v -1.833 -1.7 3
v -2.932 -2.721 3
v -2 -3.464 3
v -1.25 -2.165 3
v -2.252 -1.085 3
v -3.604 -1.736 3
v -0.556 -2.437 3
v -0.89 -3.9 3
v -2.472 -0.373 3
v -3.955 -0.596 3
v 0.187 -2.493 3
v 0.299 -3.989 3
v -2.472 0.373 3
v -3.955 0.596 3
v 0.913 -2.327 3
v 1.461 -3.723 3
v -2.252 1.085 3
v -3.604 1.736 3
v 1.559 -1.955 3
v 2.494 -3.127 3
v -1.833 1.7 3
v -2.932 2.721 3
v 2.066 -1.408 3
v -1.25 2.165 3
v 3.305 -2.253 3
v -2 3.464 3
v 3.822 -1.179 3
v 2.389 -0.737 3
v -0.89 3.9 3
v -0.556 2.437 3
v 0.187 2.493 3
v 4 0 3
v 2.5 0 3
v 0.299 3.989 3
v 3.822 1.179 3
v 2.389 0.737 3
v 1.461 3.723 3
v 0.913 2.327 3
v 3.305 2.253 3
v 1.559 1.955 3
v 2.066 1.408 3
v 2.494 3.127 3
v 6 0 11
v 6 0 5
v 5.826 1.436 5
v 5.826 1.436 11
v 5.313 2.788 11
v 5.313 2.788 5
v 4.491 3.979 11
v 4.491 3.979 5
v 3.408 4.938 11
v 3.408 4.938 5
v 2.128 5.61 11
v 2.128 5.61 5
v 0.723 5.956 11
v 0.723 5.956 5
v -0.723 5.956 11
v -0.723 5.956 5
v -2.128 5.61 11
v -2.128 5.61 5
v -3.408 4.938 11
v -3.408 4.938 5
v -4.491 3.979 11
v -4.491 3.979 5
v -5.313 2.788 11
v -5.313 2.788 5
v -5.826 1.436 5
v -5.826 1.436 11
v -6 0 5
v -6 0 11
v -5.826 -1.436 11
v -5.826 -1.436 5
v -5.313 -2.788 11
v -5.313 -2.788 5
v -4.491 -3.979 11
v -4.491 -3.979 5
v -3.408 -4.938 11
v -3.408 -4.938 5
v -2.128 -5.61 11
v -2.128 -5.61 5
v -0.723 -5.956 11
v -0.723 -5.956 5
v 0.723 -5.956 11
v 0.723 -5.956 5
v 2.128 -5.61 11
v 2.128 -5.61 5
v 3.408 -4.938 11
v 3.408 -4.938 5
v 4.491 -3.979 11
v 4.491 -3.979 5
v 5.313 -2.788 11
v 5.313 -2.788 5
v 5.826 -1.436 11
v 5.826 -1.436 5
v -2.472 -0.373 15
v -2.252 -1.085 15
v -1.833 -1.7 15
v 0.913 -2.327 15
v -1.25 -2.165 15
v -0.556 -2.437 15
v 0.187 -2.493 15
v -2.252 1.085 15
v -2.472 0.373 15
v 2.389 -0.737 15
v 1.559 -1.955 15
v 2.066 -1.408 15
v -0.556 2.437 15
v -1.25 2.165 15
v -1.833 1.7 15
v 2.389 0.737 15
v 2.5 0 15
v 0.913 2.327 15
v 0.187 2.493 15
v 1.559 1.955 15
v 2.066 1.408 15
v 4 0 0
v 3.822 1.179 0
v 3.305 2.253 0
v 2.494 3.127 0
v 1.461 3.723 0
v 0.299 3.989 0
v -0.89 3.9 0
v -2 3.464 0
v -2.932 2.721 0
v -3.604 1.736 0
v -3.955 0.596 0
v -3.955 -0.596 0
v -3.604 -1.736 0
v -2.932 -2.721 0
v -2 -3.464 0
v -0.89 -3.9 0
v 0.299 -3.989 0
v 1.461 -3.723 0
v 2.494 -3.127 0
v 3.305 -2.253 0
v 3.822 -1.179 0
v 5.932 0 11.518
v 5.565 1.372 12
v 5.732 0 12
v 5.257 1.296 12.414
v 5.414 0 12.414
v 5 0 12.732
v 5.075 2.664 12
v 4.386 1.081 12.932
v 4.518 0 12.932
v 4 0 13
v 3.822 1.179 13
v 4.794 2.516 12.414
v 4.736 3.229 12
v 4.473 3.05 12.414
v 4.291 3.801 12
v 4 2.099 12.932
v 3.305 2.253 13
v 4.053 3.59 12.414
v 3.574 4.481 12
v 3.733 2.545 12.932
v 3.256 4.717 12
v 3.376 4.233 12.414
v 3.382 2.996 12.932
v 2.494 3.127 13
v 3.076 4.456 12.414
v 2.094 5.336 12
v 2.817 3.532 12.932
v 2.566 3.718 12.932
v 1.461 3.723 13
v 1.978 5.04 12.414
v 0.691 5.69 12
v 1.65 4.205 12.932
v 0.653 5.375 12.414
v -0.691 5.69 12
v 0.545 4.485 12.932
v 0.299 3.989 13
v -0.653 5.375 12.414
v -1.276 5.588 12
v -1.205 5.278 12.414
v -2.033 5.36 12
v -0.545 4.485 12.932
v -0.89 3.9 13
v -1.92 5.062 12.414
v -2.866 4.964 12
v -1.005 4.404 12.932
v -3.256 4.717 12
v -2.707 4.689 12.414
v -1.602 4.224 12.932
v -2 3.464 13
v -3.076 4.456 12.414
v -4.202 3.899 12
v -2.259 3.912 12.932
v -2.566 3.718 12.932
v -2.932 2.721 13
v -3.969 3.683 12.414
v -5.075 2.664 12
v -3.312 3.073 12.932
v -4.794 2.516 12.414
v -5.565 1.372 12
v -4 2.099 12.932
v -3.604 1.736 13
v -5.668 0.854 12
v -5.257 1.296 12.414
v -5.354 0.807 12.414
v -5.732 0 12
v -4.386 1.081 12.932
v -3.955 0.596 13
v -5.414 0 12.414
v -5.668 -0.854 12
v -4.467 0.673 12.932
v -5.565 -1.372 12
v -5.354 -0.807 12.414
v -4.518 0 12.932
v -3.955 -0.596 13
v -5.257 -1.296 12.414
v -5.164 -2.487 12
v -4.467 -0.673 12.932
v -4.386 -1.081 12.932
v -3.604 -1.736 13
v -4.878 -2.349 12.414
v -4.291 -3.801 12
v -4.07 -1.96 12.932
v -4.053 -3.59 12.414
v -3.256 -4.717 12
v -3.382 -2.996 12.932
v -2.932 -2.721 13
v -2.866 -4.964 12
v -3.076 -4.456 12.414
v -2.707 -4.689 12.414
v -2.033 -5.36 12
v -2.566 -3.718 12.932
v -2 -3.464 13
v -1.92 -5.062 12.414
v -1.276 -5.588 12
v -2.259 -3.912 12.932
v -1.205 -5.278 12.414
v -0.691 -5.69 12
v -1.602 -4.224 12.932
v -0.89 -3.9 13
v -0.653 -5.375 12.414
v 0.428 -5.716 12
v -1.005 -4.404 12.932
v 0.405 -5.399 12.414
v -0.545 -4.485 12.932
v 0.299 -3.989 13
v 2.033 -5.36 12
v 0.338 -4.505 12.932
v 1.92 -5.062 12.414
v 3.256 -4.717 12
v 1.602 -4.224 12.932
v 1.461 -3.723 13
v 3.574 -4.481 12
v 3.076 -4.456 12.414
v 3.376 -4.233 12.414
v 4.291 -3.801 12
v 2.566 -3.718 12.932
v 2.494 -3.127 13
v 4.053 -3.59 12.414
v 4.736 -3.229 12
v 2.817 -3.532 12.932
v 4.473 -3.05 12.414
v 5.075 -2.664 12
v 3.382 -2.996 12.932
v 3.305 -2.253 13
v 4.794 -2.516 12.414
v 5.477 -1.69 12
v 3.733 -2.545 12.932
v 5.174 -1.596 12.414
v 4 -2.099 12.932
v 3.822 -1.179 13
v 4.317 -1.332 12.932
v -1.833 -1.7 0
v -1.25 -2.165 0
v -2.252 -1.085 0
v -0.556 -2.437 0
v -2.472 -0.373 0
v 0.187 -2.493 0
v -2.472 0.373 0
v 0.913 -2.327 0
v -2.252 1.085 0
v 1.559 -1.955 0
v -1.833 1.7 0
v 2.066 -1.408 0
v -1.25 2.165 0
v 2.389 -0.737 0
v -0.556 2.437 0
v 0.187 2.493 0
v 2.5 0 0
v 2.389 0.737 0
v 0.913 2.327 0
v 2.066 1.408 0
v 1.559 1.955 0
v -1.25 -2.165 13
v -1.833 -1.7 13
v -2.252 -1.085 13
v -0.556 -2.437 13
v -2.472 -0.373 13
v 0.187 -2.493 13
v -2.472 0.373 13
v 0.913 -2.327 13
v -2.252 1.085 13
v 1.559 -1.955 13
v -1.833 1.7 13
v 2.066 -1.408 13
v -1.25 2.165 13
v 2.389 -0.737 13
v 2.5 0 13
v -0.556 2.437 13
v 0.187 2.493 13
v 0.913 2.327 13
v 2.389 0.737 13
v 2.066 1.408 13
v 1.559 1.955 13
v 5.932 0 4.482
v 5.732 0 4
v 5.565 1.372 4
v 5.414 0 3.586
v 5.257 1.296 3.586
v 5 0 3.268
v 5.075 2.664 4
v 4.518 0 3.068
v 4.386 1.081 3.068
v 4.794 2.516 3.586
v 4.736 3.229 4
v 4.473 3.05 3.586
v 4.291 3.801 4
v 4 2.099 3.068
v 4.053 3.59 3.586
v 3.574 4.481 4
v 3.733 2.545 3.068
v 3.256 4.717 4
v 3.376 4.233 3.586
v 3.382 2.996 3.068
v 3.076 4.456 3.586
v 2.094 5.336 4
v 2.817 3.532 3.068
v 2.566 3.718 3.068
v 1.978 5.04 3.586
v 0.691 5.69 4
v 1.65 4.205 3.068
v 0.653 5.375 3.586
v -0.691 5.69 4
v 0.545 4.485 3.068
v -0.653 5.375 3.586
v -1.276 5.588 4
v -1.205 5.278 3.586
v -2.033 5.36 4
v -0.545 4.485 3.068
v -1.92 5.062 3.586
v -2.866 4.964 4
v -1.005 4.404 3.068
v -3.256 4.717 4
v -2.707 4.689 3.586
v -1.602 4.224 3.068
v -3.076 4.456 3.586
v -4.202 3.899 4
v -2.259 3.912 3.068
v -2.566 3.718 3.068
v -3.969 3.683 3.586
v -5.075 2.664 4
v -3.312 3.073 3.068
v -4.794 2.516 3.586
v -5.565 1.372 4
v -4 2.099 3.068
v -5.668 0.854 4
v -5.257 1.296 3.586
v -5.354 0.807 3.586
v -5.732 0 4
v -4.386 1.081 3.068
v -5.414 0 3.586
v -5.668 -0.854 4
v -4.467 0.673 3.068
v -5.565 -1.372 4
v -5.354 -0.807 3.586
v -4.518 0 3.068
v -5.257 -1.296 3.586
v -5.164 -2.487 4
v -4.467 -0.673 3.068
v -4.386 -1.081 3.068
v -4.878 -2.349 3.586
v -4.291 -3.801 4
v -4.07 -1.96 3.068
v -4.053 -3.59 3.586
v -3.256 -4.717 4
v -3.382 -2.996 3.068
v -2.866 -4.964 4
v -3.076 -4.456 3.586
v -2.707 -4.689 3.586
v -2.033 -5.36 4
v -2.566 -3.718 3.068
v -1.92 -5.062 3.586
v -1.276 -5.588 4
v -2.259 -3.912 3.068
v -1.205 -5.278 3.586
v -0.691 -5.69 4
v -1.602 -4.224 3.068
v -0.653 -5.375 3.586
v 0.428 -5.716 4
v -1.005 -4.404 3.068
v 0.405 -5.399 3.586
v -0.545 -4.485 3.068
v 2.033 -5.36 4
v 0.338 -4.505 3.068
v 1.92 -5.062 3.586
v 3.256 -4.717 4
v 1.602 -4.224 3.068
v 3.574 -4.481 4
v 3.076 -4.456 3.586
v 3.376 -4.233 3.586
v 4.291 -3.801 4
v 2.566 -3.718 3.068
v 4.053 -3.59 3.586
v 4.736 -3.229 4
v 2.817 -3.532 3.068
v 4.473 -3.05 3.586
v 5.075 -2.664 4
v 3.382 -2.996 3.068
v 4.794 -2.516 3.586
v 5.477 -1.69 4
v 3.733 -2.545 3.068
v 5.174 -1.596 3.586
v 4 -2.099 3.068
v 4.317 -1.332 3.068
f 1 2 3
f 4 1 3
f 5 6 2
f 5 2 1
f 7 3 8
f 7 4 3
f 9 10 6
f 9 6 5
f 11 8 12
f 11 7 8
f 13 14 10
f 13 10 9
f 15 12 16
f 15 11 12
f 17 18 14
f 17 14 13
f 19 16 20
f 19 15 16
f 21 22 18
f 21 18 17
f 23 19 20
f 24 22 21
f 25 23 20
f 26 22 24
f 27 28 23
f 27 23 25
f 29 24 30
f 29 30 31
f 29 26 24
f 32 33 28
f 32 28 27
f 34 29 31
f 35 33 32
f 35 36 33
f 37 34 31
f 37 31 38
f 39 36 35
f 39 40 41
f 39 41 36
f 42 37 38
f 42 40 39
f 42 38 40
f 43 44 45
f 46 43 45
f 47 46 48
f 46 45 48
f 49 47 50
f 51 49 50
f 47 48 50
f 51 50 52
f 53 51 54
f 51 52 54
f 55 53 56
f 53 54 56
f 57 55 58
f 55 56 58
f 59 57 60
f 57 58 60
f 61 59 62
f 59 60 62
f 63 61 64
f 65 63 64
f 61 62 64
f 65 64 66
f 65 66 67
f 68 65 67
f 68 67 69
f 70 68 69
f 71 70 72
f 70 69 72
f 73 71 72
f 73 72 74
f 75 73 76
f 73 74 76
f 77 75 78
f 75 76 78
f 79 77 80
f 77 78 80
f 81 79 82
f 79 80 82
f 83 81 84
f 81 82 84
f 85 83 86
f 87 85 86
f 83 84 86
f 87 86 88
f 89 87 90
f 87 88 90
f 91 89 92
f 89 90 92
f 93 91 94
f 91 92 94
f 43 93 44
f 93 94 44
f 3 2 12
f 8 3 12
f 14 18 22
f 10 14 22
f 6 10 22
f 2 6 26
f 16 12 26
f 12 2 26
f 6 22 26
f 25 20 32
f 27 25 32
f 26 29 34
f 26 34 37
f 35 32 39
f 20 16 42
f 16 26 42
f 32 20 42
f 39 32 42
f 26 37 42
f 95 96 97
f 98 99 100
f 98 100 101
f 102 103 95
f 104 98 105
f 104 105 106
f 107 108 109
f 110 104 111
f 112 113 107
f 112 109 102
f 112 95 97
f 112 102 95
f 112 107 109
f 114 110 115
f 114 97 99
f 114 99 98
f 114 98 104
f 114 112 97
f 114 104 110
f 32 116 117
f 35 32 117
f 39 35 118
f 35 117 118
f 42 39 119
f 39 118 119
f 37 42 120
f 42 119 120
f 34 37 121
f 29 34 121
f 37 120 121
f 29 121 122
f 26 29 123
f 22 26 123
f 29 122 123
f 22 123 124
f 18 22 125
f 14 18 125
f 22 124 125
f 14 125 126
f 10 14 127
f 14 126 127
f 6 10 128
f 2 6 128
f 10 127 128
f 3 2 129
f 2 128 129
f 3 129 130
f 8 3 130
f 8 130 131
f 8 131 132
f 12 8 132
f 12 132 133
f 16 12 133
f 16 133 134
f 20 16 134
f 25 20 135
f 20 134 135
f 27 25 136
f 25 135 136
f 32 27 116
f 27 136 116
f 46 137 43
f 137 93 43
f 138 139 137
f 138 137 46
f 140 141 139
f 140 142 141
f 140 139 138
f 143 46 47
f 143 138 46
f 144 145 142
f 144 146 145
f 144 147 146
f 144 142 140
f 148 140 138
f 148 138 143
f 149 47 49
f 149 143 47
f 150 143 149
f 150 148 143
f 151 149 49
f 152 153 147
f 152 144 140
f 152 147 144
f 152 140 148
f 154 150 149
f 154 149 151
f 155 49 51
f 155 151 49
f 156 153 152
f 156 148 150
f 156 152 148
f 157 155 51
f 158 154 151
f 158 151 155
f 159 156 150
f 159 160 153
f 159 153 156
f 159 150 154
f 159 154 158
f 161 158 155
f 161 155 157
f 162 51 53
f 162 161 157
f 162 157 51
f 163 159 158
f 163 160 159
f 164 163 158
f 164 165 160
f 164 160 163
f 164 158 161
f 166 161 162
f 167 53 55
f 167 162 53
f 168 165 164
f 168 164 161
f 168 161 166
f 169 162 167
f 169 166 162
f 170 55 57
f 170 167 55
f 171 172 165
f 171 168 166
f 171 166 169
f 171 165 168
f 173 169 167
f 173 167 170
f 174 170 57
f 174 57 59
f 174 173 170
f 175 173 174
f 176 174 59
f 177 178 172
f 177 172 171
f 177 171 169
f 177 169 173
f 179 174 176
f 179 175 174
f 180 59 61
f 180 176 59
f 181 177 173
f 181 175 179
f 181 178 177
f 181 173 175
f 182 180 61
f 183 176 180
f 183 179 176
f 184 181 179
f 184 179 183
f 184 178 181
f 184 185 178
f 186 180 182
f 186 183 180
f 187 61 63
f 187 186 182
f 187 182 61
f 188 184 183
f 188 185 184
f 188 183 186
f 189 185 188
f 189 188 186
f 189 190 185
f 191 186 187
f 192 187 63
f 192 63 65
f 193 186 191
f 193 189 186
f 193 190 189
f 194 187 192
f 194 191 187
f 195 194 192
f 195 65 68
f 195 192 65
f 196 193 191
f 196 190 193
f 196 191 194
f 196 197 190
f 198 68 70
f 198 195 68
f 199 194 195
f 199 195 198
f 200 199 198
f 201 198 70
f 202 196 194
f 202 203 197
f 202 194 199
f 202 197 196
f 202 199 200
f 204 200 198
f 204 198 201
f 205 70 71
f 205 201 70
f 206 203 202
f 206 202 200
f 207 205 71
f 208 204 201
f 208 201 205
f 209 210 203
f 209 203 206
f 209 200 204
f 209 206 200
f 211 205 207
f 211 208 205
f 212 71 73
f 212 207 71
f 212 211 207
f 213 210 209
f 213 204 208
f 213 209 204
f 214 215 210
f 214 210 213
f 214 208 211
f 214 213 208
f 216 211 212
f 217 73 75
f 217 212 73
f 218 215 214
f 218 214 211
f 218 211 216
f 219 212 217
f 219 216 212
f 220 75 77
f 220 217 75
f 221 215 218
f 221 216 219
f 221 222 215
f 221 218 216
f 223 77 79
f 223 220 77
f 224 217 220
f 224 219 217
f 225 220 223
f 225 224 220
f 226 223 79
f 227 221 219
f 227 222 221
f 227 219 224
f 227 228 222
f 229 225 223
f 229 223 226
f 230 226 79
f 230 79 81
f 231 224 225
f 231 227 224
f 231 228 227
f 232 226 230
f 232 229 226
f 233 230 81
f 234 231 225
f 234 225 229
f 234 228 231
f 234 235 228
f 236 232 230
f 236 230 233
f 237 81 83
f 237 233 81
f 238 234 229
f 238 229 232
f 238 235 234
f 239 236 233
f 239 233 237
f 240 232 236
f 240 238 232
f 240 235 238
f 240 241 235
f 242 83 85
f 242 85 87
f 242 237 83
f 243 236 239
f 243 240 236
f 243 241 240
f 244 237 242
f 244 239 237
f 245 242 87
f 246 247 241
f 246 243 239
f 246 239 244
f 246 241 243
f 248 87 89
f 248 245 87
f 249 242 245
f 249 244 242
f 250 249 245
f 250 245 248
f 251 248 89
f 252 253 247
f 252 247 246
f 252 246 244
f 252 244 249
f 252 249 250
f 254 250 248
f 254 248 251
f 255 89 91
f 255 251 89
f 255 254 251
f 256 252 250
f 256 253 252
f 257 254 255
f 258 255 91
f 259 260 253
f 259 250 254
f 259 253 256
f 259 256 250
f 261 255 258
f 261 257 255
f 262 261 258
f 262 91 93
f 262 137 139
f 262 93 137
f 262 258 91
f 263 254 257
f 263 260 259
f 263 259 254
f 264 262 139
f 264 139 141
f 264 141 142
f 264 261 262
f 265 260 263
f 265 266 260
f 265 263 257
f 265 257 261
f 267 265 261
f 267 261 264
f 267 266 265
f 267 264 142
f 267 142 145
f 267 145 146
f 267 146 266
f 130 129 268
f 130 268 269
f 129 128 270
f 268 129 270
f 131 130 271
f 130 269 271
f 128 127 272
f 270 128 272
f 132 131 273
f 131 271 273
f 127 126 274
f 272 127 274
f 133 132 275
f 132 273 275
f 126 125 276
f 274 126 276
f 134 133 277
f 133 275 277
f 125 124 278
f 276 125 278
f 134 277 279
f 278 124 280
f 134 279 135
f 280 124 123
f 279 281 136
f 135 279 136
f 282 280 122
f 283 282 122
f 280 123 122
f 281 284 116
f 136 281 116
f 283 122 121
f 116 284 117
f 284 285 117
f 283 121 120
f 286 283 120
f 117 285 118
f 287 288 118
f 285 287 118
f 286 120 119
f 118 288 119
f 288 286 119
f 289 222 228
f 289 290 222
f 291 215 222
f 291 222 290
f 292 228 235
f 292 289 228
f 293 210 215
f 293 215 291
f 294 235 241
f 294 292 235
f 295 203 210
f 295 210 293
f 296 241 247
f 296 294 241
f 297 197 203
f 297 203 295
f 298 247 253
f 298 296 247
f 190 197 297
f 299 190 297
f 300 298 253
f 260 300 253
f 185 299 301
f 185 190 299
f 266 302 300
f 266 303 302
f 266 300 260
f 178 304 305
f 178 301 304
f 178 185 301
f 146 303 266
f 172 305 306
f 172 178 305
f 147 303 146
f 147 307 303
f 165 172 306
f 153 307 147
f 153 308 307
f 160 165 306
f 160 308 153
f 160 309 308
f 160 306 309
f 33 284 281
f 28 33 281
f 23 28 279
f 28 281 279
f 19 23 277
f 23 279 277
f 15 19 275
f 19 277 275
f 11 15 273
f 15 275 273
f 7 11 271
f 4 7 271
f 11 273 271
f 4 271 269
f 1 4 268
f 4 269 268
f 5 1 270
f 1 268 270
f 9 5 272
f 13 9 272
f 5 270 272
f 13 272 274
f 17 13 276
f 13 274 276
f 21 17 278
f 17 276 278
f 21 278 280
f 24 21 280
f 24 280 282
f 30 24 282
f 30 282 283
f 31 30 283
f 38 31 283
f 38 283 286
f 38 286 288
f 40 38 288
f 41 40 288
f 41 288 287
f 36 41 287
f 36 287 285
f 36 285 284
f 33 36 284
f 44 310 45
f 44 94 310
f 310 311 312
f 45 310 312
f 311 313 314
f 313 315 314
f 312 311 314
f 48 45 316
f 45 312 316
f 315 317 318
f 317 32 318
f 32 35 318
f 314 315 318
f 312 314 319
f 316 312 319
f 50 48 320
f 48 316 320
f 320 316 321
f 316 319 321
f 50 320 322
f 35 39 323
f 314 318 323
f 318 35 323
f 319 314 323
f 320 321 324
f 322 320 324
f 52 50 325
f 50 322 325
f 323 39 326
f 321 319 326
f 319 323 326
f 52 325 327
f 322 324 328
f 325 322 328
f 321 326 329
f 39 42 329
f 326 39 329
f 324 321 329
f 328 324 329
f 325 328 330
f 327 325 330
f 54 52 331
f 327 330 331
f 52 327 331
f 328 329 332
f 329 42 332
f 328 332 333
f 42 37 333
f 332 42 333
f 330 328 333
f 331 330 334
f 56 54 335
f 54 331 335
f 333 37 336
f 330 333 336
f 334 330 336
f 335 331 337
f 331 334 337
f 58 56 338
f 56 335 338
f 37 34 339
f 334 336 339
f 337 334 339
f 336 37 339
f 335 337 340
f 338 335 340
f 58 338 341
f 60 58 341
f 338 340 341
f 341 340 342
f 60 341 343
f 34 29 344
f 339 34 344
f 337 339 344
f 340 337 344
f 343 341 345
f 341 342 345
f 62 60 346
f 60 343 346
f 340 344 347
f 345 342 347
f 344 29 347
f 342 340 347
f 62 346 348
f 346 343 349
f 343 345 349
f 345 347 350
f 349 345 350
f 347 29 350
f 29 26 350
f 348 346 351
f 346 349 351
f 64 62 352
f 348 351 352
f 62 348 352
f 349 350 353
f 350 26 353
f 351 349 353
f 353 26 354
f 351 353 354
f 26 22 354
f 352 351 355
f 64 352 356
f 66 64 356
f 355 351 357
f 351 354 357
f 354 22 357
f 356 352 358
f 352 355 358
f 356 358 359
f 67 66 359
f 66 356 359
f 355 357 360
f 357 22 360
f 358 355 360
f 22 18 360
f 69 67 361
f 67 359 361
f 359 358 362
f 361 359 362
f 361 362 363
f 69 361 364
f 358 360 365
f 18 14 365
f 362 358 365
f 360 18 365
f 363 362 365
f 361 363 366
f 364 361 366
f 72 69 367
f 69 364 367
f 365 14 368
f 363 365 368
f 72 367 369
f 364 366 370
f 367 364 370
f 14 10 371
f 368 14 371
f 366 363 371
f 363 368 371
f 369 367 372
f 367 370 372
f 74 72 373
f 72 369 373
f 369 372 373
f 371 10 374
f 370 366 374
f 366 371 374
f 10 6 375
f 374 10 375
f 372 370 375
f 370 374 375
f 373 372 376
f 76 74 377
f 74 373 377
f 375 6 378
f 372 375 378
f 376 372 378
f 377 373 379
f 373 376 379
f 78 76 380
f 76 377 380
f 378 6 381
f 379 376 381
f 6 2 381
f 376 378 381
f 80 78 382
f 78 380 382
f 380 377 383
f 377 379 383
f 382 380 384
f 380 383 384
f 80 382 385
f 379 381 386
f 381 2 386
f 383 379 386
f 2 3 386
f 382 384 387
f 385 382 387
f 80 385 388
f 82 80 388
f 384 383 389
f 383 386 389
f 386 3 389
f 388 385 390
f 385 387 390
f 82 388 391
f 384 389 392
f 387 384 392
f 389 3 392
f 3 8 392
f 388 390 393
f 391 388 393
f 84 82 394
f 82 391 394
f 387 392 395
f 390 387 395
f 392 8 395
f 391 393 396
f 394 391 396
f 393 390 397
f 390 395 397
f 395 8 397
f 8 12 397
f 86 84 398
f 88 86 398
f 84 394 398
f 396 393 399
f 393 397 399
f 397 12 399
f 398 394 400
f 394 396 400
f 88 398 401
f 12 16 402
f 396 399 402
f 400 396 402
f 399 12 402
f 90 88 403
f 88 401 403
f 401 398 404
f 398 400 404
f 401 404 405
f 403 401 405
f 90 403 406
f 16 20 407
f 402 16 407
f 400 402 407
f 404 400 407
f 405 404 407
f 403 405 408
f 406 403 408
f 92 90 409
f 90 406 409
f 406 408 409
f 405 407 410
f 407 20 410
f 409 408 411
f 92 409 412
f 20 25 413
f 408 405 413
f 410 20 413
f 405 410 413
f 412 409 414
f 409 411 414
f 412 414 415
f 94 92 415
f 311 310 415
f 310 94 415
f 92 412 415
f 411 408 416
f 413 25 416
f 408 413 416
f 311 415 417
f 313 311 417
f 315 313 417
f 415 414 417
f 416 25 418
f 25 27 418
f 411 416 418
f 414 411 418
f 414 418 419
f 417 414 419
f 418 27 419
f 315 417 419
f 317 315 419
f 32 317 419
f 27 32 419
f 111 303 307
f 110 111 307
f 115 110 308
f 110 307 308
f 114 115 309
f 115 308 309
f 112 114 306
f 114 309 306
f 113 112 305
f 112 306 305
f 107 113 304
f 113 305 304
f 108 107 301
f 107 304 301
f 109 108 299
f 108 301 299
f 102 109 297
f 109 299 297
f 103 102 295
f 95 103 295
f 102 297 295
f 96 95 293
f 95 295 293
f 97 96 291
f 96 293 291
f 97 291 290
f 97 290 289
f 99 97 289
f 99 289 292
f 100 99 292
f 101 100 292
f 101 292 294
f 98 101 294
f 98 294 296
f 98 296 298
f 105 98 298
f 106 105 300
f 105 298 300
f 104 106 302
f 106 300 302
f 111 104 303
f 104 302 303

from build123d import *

# Parameters (mm, degrees)
F0_R     = 4
F1_DEPTH = 3
F2_R     = 6
F3_DEPTH = 10
F4_R     = 2.5
F5_DEPTH = 2
F6_R     = 2
F7_R     = 2.5
F8_DEPTH = 8


with BuildPart() as f1:
    # F0 (on Top) → F1 (new body)
    with BuildSketch(Plane.XY):
        Circle(F0_R)
    extrude(amount=F1_DEPTH)

    # F7 (on face) → F8 (cut)
    with BuildSketch(Plane(origin=(0, 0, 0), x_dir=(1, 0, 0), z_dir=(0, 0, -1))):
        Circle(F7_R)
    extrude(amount=-F8_DEPTH, mode=Mode.SUBTRACT)


with BuildPart() as f3:
    # F2 (on face) → F3 (new body)
    with BuildSketch(Plane.XY.offset(3)):
        Circle(F2_R)
    extrude(amount=F3_DEPTH)

    # F4 (on face) → F5 (join)
    with BuildSketch(Plane.XY.offset(13)):
        Circle(F4_R)
    extrude(amount=F5_DEPTH)

    # F6
    f6_edges = [f3.edges().sort_by_distance(p)[0] for p in [
        (-6, 0, 13),
        (-6, 0, 3),
    ]]
    fillet(f6_edges, radius=F6_R)


solid = Compound([f1.part, f3.part])
